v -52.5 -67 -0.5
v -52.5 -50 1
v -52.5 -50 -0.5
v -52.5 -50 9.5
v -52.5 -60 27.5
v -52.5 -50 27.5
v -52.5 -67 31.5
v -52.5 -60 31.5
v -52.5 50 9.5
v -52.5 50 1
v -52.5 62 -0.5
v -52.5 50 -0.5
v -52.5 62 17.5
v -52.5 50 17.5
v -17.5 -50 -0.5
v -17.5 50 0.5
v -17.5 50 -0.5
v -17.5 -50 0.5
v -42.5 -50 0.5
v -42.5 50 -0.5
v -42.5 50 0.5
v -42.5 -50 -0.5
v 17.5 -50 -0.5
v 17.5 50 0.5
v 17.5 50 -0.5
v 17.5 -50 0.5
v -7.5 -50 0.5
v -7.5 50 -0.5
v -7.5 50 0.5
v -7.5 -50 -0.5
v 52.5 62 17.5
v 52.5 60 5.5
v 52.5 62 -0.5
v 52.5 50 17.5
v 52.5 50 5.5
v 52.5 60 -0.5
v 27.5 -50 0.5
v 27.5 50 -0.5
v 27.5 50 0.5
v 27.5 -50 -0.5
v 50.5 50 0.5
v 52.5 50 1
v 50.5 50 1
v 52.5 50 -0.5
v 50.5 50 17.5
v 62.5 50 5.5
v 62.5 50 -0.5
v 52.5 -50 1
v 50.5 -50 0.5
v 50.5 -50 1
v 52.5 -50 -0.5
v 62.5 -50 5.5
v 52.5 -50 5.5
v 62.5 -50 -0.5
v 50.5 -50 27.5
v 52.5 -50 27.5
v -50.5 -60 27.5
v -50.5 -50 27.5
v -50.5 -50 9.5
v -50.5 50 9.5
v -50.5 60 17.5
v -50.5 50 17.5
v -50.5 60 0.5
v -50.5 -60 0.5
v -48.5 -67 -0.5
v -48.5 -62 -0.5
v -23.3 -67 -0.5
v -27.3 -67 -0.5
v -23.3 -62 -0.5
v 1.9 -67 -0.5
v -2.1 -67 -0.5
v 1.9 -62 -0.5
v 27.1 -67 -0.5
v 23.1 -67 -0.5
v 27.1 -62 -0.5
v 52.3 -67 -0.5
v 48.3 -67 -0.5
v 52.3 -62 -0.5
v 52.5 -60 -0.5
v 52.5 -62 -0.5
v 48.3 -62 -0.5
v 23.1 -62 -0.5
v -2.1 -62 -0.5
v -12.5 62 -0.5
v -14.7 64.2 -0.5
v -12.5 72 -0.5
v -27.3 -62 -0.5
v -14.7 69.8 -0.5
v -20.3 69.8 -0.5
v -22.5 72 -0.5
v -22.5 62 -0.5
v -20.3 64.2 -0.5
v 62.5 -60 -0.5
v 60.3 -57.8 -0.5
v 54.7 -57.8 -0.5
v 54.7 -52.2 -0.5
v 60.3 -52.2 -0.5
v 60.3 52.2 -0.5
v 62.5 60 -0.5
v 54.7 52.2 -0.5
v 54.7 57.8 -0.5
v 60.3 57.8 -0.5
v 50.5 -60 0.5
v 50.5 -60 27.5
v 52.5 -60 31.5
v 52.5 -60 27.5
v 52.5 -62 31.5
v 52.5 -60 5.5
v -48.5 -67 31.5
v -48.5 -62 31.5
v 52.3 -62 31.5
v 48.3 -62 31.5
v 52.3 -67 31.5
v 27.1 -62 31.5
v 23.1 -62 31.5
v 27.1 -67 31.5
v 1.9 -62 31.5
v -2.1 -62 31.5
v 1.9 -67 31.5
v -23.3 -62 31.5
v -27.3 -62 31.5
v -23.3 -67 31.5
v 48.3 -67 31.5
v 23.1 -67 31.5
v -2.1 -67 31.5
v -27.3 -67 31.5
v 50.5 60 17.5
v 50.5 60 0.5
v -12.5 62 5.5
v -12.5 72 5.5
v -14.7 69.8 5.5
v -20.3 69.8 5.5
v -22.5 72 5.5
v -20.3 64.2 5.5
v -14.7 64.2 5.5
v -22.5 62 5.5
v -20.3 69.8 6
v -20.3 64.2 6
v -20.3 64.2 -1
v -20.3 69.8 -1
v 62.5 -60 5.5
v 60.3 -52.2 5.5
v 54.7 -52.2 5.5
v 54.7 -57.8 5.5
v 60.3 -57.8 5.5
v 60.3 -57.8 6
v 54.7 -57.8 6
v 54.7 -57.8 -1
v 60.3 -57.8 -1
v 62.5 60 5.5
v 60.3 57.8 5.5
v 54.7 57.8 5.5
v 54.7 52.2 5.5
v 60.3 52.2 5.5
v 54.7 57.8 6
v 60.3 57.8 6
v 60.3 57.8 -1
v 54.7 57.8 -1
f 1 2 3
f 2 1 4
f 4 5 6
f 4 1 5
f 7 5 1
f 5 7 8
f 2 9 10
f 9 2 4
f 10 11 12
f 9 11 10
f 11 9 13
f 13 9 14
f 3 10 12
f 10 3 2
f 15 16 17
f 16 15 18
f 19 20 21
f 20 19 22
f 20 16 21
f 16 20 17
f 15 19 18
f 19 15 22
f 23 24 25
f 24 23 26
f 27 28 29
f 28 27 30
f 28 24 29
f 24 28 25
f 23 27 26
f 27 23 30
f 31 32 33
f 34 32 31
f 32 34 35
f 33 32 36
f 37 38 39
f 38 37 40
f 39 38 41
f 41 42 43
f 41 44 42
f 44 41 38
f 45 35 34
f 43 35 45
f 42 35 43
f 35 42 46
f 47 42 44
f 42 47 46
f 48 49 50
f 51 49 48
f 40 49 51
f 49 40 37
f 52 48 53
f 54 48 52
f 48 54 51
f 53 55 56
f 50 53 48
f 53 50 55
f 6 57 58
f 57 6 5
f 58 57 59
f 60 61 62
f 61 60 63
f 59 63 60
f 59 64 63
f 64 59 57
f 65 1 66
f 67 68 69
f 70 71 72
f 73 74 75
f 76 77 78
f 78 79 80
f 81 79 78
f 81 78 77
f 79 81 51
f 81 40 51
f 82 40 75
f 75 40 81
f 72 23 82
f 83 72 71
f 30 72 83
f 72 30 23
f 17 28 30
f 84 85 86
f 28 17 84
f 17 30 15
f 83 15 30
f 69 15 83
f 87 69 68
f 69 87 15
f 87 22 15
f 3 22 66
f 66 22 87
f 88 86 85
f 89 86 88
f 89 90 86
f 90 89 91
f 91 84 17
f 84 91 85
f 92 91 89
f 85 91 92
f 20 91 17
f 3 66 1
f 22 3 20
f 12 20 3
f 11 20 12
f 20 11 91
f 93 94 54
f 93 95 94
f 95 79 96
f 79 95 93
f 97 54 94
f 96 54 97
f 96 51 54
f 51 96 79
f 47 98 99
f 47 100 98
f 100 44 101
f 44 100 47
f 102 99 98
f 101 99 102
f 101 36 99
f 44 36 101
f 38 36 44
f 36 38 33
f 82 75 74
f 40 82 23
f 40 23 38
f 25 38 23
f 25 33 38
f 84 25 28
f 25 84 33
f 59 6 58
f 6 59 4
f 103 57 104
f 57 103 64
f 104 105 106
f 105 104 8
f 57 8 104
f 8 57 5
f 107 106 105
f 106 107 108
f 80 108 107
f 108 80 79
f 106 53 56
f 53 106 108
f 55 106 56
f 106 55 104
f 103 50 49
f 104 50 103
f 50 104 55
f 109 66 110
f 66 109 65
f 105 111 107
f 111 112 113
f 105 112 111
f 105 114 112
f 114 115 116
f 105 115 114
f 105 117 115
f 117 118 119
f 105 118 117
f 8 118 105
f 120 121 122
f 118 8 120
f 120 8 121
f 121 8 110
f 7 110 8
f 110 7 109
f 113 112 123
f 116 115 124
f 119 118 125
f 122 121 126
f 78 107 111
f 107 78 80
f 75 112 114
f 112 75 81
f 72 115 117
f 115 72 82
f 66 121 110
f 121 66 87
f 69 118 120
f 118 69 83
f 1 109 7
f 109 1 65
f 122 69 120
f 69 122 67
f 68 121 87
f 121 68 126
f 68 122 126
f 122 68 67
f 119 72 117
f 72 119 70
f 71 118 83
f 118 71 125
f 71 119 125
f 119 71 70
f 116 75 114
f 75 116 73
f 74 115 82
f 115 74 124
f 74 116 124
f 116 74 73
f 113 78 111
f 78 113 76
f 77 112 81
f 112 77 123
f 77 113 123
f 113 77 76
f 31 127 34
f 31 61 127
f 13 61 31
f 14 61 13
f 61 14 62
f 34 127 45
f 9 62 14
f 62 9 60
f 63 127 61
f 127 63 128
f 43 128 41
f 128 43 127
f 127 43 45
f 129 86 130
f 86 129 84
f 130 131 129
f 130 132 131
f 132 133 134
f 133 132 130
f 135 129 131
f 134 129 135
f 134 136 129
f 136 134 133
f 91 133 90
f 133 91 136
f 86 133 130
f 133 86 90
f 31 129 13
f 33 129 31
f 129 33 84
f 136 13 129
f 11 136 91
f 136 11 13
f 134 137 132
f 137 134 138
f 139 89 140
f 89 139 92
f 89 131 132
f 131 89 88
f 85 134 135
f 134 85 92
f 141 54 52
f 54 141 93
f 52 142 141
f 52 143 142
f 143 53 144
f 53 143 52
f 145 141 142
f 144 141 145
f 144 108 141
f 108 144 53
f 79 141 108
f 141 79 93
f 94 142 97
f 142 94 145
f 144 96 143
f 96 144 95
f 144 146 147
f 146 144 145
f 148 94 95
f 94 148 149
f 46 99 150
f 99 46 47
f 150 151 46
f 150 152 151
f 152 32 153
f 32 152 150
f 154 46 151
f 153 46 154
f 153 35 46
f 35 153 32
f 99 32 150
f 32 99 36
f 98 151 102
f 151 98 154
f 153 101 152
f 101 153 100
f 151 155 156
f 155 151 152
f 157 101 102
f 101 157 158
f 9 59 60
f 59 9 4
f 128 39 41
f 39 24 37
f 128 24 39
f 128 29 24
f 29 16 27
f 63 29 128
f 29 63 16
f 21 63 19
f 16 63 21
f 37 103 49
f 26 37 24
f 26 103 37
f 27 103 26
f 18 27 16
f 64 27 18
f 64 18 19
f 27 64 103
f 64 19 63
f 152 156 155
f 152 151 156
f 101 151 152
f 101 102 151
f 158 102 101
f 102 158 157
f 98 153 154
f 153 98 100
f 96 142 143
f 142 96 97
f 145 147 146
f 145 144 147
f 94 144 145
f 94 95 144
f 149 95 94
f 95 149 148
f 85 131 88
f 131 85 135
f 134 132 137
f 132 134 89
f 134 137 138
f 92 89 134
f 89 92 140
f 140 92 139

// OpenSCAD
include <../../lib/relativity.scad/relativity.scad>

floor_thickness = 1;
wall_thickness = 2;

differed("hole")
box([105, 120, floor_thickness]) {
  translated(35*x, n=[-3:0]) align(x) box([25, 100, floor_thickness*2], anchor=x, $class="hole");
  align(-y-z) color("red") box([$parent_size.x, wall_thickness, 32], anchor=y-z) {
    mirrored(x) align(x+y-z) box([wall_thickness, 10, $parent_size.z-4], anchor=x-y-z);
    translated(25.2*x, n=[0:4]) align(-x-y-z) box([4, 5, $parent_size.z], anchor=-x+y-z);
  }
  align(y-z) color("orange") box([$parent_size.x, wall_thickness, 18], anchor=-y-z) {
    mirrored(x) align(x-y-z) box([wall_thickness, 10, $parent_size.z], anchor=x+y-z);
    translated(30*x) align(-x+y-z) box([10, 10, 6], anchor=-x-y-z) box([5.6, 5.6, 7], $class="hole");
  }
  align(-x-z) box([wall_thickness, $parent_size.y, 10], anchor=-x-z);
  mirrored(y) align(x-y-z) box([10, 10, 6], anchor=-x-y-z) box([5.6, 5.6, 7], $class="hole");
};
